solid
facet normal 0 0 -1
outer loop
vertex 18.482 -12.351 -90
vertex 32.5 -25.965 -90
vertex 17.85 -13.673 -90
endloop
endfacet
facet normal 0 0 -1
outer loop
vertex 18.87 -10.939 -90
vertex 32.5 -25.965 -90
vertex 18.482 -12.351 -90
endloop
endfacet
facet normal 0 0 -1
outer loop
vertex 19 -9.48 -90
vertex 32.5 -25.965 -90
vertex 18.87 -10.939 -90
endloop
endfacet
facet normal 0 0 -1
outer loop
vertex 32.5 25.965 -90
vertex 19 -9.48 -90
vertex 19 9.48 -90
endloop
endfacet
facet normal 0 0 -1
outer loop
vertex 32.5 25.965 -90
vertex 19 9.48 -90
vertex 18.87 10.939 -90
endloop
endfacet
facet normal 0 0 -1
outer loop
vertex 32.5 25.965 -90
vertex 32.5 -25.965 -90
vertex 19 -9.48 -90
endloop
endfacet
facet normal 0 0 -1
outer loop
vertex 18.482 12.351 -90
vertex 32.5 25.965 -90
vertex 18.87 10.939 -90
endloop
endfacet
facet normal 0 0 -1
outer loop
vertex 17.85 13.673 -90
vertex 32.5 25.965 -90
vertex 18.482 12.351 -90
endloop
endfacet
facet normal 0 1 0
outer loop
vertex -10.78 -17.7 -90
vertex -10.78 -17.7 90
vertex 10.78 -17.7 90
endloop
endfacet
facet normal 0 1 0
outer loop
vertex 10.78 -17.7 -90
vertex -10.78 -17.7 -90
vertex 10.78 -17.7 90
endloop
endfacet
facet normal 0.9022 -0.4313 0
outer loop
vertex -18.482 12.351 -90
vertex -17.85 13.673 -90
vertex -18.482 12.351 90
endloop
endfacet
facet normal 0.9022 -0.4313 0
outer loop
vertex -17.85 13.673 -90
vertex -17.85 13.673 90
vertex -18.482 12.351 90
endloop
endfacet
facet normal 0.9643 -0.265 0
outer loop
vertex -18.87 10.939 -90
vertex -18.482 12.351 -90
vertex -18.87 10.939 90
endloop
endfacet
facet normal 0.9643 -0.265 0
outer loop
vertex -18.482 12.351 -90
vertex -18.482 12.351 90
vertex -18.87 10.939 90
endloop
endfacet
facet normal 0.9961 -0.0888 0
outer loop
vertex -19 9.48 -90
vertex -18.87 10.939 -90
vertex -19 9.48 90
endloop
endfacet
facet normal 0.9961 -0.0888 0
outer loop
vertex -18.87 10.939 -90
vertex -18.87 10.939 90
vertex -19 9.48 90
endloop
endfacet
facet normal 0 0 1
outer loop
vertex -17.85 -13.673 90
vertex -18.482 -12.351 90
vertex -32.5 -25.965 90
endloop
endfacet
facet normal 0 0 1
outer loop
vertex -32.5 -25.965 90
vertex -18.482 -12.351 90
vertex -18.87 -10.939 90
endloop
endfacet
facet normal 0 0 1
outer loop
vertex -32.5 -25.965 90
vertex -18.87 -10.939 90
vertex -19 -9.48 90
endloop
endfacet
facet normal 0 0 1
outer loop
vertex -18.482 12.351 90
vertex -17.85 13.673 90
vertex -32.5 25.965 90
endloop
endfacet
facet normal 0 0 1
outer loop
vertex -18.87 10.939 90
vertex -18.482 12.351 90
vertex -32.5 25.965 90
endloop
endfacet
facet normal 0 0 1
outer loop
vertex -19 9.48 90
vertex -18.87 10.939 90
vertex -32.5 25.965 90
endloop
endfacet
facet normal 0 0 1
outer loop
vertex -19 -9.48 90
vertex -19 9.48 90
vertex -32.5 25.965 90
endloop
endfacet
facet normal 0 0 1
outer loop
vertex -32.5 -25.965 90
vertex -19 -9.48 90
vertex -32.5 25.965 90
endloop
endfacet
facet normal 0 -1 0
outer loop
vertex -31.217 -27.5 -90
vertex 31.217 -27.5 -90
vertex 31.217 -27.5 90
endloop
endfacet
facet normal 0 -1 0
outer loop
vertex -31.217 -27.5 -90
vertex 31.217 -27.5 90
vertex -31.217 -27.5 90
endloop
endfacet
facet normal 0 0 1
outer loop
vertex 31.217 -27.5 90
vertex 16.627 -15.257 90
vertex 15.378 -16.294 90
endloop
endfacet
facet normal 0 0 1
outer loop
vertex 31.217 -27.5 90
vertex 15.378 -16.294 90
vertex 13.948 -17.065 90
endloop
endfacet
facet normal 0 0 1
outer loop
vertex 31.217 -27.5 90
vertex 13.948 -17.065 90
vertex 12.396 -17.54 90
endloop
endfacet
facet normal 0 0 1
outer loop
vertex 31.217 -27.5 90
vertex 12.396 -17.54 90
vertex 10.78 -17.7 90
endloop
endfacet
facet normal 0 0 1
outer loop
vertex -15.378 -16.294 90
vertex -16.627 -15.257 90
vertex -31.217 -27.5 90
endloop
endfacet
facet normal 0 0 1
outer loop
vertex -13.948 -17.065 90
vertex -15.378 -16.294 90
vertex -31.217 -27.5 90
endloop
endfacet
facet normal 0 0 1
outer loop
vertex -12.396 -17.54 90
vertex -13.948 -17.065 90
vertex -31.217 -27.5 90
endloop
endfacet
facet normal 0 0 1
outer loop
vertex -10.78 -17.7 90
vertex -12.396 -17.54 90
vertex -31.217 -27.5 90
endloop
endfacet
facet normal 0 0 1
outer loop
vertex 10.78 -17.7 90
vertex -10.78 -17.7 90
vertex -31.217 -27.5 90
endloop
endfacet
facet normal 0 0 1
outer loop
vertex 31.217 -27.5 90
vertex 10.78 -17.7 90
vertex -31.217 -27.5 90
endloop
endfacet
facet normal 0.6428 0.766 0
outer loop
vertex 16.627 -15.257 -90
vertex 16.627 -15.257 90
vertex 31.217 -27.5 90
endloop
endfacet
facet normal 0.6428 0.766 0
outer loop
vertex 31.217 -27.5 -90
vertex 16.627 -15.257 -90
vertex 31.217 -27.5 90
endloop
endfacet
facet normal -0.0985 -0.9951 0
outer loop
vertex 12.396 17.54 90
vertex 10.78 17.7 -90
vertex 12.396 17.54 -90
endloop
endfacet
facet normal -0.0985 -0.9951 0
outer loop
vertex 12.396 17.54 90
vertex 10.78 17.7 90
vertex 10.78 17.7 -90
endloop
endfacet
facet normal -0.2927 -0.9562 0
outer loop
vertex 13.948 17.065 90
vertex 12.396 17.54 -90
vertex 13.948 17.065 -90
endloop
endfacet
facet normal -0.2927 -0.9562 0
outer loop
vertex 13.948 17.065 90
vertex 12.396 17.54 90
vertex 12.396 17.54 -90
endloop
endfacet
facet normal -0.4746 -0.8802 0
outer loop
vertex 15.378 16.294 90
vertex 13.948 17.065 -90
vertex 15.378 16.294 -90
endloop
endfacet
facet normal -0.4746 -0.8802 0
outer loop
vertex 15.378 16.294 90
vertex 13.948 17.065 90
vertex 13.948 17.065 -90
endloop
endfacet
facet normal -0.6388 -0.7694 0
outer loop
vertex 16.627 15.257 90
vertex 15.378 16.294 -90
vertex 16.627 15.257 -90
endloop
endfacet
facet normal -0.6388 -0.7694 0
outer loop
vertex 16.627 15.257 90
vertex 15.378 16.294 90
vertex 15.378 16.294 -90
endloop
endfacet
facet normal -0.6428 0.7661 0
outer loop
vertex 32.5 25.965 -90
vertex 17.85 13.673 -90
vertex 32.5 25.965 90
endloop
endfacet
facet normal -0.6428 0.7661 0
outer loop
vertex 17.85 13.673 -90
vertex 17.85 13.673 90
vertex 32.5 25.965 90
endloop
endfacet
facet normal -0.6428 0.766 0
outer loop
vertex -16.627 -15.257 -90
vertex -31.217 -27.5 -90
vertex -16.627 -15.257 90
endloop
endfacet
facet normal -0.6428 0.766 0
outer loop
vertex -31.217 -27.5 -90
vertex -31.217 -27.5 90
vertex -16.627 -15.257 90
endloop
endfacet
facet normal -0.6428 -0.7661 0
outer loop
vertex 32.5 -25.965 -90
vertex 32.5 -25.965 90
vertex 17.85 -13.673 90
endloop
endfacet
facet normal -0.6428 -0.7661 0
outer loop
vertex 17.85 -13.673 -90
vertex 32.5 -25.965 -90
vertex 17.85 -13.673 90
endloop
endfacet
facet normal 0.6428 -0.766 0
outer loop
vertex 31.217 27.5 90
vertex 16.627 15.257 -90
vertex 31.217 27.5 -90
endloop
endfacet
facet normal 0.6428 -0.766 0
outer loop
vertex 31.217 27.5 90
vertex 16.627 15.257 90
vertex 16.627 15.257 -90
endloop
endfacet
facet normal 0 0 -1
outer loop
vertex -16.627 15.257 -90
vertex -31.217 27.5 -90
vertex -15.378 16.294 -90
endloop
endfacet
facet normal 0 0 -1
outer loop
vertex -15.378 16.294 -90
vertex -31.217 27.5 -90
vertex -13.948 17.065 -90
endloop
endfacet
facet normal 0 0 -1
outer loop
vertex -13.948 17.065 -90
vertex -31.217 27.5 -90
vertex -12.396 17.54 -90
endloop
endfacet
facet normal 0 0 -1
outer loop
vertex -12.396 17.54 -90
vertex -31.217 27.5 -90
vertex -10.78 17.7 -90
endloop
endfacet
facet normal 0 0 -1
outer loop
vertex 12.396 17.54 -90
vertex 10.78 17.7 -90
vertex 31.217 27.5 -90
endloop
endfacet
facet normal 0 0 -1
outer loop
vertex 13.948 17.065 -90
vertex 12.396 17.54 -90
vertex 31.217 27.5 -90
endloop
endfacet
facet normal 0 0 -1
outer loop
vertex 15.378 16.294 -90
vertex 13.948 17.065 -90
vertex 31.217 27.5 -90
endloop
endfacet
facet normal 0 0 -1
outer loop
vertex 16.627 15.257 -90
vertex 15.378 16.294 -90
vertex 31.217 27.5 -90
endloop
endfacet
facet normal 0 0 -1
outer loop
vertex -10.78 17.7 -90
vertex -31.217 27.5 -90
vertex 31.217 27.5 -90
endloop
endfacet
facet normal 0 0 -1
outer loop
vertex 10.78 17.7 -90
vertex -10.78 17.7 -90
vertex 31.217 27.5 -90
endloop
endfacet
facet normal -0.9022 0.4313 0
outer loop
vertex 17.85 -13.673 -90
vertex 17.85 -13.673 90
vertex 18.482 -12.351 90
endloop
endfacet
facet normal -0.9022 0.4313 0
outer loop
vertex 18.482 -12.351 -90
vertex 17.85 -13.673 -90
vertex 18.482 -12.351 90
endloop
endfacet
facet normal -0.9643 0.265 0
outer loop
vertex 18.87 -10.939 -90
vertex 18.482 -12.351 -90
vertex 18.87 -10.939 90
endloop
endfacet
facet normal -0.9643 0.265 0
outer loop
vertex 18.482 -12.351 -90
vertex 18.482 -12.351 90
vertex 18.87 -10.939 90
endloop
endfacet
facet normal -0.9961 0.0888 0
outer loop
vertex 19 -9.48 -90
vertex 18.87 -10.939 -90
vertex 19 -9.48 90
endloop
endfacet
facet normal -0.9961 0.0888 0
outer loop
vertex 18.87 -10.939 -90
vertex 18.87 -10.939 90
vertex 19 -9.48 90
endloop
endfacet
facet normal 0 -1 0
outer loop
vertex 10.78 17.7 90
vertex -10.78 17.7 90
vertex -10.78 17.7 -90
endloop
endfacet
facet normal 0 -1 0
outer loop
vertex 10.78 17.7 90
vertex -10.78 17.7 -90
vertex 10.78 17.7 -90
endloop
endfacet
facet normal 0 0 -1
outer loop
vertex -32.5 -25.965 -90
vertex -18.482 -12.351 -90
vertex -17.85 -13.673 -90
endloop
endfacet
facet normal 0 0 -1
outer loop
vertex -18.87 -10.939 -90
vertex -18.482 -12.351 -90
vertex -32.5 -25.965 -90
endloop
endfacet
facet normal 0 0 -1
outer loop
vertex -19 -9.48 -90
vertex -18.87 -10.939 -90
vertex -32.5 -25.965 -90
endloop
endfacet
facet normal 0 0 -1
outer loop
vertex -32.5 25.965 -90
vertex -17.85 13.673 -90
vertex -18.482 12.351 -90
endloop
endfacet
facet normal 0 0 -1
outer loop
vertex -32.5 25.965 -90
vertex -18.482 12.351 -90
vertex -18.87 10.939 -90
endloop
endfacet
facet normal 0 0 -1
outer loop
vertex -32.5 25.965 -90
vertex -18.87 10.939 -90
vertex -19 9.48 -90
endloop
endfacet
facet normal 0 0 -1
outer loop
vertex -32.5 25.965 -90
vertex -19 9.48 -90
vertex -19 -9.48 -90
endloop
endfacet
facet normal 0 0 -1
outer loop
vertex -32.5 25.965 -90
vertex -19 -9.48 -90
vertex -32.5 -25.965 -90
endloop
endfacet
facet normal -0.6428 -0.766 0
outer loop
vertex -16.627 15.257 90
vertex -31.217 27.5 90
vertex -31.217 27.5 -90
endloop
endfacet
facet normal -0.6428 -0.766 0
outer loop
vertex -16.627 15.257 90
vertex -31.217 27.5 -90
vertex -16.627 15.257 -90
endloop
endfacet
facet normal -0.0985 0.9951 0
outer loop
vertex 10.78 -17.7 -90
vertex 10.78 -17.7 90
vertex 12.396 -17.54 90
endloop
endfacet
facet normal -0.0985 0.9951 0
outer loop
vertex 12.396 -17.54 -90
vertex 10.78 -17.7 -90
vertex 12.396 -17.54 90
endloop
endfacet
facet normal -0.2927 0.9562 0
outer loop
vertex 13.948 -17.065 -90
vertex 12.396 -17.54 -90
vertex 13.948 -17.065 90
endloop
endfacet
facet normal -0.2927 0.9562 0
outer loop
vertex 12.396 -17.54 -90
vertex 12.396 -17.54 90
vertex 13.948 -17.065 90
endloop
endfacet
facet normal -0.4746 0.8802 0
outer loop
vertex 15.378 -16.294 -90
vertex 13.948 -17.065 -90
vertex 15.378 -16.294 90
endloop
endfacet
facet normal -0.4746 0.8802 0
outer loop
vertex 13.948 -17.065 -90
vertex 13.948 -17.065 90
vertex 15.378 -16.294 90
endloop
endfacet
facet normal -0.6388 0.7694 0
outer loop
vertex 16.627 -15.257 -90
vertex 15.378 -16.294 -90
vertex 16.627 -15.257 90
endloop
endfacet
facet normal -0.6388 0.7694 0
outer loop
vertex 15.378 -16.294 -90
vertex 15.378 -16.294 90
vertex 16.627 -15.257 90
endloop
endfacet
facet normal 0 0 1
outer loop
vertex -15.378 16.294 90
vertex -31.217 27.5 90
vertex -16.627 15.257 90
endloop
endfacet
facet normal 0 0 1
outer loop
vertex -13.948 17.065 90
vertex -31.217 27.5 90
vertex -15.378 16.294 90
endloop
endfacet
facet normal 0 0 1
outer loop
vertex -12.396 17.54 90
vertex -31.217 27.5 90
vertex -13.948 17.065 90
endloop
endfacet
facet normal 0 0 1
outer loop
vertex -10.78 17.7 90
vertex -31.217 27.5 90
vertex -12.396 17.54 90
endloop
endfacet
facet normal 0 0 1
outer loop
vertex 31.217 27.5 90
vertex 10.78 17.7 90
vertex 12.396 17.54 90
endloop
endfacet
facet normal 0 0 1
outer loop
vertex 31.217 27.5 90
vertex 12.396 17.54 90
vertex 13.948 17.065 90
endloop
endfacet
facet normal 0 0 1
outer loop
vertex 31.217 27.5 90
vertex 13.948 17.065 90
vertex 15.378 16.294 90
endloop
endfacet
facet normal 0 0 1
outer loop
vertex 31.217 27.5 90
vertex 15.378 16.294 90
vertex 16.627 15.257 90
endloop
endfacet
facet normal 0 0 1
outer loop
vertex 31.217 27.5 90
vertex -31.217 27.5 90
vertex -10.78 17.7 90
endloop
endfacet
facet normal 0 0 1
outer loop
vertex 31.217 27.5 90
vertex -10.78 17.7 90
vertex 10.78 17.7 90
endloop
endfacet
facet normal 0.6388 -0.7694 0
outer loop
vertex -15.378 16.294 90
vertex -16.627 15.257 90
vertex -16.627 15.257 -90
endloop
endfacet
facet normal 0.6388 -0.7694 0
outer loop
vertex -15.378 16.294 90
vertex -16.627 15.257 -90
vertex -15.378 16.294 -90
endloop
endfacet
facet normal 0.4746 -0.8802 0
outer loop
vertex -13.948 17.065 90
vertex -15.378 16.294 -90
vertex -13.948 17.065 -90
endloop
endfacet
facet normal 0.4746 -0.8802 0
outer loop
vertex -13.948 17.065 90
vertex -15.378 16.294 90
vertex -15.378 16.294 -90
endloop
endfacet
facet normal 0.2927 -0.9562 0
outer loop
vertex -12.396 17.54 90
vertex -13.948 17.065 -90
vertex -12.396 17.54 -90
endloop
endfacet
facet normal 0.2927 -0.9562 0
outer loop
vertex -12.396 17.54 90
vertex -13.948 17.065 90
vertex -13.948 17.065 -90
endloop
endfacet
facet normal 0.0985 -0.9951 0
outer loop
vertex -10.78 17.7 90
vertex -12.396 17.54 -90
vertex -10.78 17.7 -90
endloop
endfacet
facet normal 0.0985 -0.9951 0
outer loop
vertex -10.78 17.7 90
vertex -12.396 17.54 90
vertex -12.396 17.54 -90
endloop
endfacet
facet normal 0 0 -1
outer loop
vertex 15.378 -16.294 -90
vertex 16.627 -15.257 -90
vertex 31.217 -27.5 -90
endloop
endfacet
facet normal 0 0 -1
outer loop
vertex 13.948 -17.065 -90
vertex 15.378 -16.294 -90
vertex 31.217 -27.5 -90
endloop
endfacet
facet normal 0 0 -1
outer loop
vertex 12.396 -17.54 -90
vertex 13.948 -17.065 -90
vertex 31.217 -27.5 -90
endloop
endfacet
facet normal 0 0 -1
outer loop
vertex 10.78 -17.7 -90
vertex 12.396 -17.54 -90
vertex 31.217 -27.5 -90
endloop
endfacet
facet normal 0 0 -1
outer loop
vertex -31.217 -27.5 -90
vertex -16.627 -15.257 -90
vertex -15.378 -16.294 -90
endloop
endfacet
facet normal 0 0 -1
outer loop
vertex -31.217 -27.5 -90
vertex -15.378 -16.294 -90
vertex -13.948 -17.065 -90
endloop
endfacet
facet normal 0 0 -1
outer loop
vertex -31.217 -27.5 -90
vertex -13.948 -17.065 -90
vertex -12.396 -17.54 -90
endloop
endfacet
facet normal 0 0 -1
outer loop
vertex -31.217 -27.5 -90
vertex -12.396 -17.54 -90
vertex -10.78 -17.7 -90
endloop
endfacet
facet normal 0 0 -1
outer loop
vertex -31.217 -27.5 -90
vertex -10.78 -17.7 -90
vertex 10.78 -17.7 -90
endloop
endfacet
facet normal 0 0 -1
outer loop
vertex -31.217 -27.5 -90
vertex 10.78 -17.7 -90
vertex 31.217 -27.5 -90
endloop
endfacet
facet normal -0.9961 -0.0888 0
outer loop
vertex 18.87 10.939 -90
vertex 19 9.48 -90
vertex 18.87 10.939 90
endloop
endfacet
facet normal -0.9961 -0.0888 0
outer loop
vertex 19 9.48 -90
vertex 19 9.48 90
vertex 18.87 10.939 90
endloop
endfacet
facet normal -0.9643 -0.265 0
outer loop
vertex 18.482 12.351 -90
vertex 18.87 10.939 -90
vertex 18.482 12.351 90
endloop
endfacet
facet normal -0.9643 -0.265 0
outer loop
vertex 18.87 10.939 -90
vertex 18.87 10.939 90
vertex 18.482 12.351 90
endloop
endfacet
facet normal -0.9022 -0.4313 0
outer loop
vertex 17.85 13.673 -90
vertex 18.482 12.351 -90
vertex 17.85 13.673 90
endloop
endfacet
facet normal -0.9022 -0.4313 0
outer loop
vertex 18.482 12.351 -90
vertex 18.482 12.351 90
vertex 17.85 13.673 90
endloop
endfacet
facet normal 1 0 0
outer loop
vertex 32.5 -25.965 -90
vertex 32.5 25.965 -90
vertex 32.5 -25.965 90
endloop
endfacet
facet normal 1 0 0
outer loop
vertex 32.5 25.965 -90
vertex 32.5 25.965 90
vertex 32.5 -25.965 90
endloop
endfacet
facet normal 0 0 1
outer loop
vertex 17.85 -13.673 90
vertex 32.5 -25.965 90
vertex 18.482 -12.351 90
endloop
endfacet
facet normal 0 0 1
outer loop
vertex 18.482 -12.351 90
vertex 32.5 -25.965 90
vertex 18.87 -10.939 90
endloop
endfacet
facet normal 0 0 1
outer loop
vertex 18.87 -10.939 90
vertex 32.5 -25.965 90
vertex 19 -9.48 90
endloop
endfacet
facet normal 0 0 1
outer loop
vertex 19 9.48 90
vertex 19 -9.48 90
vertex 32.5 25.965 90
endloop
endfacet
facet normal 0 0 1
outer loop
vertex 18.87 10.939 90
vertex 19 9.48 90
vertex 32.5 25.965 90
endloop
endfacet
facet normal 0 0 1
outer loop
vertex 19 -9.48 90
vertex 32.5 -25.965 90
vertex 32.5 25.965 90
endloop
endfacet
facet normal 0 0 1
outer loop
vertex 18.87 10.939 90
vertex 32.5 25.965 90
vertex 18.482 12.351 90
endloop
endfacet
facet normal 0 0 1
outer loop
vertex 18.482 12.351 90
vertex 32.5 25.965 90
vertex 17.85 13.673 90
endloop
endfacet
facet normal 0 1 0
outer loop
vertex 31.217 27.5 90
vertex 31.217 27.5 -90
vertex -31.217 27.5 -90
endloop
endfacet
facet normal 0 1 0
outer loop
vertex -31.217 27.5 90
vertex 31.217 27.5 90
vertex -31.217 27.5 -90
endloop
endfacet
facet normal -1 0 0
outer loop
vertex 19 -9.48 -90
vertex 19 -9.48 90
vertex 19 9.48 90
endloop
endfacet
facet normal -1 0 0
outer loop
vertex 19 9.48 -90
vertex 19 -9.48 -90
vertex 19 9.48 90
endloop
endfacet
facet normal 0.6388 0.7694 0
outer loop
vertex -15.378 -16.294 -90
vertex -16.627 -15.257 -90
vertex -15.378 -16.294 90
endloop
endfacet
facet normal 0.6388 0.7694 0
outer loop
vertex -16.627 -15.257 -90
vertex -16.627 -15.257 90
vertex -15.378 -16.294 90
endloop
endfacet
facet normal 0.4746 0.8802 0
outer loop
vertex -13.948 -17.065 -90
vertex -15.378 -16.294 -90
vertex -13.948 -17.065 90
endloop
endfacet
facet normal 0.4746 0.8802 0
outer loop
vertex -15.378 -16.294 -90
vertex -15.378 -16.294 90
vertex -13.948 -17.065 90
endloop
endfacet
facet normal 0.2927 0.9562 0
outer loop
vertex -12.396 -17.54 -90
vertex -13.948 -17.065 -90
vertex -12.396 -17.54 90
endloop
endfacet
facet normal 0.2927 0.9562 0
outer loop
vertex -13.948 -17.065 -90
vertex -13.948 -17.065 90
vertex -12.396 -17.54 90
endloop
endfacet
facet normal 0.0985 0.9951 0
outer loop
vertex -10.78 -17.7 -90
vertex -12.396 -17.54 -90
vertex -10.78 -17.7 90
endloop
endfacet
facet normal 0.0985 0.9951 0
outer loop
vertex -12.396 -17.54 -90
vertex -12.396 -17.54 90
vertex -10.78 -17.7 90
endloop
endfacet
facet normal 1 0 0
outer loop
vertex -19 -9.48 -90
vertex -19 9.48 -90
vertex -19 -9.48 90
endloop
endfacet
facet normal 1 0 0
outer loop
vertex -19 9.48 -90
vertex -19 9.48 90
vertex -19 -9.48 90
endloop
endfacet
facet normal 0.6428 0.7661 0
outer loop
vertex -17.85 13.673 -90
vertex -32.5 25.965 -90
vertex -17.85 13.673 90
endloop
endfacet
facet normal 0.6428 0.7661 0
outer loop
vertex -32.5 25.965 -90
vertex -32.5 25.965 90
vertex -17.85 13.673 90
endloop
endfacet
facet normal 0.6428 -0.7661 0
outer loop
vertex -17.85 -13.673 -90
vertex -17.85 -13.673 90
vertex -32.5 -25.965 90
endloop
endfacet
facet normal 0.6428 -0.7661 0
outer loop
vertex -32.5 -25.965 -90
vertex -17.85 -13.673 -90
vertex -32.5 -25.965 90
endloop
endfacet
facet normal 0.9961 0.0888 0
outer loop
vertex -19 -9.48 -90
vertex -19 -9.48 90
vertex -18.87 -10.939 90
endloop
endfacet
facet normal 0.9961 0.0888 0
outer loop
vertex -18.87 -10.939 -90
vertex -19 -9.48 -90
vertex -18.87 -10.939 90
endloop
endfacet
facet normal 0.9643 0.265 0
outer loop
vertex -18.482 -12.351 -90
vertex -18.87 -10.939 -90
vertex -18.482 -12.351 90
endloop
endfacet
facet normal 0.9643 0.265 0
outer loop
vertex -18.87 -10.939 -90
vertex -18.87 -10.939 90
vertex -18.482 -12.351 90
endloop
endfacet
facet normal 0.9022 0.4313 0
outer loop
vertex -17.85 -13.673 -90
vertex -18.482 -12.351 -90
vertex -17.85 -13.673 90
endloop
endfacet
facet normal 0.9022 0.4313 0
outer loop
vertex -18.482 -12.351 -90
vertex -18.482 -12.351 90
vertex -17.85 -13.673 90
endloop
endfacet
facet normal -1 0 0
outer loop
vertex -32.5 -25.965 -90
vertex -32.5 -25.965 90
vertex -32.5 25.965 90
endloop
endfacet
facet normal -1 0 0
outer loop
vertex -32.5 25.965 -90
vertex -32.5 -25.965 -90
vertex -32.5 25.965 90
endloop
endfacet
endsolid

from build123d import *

# Parameters (mm, degrees)
EXTRUDE_1_DEPTH   = 90
EXTRUDE_1_2_DEPTH = 90
EXTRUDE_1_3_DEPTH = 90
EXTRUDE_1_4_DEPTH = 90


with BuildPart() as part:
    # 草图1 → 凸台-拉伸1 (new, symmetric)
    with BuildSketch(Plane.XY):
        with BuildLine():
            Line((31.217499969, 27.5), (-31.217499969, 27.5))
            Line((-31.217499969, 27.5), (-16.627276387, 15.257348773))
            ThreePointArc((-16.627276387, 15.257348773), (-13.948484897, 17.064794227), (-10.78, 17.7))
            Line((-10.78, 17.7), (10.78, 17.7))
            ThreePointArc((10.78, 17.7), (13.948484897, 17.064794227), (16.627276387, 15.257348773))
            Line((16.627276387, 15.257348773), (31.217499969, 27.5))
        make_face()
    extrude(amount=EXTRUDE_1_DEPTH, both=True)


with BuildPart() as body_2:
    # 草图1 → Extrude 1 2 (new, symmetric)
    with BuildSketch(Plane.XY):
        with BuildLine():
            Line((-32.5, -25.965330724), (-32.5, 25.965330724))
            Line((-32.5, 25.965330724), (-17.850295924, 13.672769437))
            ThreePointArc((-17.850295924, 13.672769437), (-18.707365025, 11.65377178), (-19, 9.48))
            Line((-19, 9.48), (-19, -9.48))
            ThreePointArc((-19, -9.48), (-18.707365025, -11.65377178), (-17.850295924, -13.672769437))
            Line((-17.850295924, -13.672769437), (-32.5, -25.965330724))
        make_face()
    extrude(amount=EXTRUDE_1_2_DEPTH, both=True)


with BuildPart() as body_3:
    # 草图1 → Extrude 1 3 (new, symmetric)
    with BuildSketch(Plane.XY):
        with BuildLine():
            Line((19, -9.48), (19, 9.48))
            ThreePointArc((19, 9.48), (18.707365025, 11.65377178), (17.850295924, 13.672769437))
            Line((17.850295924, 13.672769437), (32.5, 25.965330724))
            Line((32.5, 25.965330724), (32.5, -25.965330724))
            Line((32.5, -25.965330724), (17.850295924, -13.672769437))
            ThreePointArc((17.850295924, -13.672769437), (18.707365025, -11.65377178), (19, -9.48))
        make_face()
    extrude(amount=EXTRUDE_1_3_DEPTH, both=True)


with BuildPart() as body_4:
    # 草图1 → Extrude 1 4 (new, symmetric)
    with BuildSketch(Plane.XY):
        with BuildLine():
            Line((16.627276387, -15.257348773), (31.217499969, -27.5))
            Line((31.217499969, -27.5), (-31.217499969, -27.5))
            Line((-31.217499969, -27.5), (-16.627276387, -15.257348773))
            ThreePointArc((-16.627276387, -15.257348773), (-13.948484897, -17.064794227), (-10.78, -17.7))
            Line((-10.78, -17.7), (10.78, -17.7))
            ThreePointArc((10.78, -17.7), (13.948484897, -17.064794227), (16.627276387, -15.257348773))
        make_face()
    extrude(amount=EXTRUDE_1_4_DEPTH, both=True)


solid = Compound([part.part, body_2.part, body_3.part, body_4.part])
